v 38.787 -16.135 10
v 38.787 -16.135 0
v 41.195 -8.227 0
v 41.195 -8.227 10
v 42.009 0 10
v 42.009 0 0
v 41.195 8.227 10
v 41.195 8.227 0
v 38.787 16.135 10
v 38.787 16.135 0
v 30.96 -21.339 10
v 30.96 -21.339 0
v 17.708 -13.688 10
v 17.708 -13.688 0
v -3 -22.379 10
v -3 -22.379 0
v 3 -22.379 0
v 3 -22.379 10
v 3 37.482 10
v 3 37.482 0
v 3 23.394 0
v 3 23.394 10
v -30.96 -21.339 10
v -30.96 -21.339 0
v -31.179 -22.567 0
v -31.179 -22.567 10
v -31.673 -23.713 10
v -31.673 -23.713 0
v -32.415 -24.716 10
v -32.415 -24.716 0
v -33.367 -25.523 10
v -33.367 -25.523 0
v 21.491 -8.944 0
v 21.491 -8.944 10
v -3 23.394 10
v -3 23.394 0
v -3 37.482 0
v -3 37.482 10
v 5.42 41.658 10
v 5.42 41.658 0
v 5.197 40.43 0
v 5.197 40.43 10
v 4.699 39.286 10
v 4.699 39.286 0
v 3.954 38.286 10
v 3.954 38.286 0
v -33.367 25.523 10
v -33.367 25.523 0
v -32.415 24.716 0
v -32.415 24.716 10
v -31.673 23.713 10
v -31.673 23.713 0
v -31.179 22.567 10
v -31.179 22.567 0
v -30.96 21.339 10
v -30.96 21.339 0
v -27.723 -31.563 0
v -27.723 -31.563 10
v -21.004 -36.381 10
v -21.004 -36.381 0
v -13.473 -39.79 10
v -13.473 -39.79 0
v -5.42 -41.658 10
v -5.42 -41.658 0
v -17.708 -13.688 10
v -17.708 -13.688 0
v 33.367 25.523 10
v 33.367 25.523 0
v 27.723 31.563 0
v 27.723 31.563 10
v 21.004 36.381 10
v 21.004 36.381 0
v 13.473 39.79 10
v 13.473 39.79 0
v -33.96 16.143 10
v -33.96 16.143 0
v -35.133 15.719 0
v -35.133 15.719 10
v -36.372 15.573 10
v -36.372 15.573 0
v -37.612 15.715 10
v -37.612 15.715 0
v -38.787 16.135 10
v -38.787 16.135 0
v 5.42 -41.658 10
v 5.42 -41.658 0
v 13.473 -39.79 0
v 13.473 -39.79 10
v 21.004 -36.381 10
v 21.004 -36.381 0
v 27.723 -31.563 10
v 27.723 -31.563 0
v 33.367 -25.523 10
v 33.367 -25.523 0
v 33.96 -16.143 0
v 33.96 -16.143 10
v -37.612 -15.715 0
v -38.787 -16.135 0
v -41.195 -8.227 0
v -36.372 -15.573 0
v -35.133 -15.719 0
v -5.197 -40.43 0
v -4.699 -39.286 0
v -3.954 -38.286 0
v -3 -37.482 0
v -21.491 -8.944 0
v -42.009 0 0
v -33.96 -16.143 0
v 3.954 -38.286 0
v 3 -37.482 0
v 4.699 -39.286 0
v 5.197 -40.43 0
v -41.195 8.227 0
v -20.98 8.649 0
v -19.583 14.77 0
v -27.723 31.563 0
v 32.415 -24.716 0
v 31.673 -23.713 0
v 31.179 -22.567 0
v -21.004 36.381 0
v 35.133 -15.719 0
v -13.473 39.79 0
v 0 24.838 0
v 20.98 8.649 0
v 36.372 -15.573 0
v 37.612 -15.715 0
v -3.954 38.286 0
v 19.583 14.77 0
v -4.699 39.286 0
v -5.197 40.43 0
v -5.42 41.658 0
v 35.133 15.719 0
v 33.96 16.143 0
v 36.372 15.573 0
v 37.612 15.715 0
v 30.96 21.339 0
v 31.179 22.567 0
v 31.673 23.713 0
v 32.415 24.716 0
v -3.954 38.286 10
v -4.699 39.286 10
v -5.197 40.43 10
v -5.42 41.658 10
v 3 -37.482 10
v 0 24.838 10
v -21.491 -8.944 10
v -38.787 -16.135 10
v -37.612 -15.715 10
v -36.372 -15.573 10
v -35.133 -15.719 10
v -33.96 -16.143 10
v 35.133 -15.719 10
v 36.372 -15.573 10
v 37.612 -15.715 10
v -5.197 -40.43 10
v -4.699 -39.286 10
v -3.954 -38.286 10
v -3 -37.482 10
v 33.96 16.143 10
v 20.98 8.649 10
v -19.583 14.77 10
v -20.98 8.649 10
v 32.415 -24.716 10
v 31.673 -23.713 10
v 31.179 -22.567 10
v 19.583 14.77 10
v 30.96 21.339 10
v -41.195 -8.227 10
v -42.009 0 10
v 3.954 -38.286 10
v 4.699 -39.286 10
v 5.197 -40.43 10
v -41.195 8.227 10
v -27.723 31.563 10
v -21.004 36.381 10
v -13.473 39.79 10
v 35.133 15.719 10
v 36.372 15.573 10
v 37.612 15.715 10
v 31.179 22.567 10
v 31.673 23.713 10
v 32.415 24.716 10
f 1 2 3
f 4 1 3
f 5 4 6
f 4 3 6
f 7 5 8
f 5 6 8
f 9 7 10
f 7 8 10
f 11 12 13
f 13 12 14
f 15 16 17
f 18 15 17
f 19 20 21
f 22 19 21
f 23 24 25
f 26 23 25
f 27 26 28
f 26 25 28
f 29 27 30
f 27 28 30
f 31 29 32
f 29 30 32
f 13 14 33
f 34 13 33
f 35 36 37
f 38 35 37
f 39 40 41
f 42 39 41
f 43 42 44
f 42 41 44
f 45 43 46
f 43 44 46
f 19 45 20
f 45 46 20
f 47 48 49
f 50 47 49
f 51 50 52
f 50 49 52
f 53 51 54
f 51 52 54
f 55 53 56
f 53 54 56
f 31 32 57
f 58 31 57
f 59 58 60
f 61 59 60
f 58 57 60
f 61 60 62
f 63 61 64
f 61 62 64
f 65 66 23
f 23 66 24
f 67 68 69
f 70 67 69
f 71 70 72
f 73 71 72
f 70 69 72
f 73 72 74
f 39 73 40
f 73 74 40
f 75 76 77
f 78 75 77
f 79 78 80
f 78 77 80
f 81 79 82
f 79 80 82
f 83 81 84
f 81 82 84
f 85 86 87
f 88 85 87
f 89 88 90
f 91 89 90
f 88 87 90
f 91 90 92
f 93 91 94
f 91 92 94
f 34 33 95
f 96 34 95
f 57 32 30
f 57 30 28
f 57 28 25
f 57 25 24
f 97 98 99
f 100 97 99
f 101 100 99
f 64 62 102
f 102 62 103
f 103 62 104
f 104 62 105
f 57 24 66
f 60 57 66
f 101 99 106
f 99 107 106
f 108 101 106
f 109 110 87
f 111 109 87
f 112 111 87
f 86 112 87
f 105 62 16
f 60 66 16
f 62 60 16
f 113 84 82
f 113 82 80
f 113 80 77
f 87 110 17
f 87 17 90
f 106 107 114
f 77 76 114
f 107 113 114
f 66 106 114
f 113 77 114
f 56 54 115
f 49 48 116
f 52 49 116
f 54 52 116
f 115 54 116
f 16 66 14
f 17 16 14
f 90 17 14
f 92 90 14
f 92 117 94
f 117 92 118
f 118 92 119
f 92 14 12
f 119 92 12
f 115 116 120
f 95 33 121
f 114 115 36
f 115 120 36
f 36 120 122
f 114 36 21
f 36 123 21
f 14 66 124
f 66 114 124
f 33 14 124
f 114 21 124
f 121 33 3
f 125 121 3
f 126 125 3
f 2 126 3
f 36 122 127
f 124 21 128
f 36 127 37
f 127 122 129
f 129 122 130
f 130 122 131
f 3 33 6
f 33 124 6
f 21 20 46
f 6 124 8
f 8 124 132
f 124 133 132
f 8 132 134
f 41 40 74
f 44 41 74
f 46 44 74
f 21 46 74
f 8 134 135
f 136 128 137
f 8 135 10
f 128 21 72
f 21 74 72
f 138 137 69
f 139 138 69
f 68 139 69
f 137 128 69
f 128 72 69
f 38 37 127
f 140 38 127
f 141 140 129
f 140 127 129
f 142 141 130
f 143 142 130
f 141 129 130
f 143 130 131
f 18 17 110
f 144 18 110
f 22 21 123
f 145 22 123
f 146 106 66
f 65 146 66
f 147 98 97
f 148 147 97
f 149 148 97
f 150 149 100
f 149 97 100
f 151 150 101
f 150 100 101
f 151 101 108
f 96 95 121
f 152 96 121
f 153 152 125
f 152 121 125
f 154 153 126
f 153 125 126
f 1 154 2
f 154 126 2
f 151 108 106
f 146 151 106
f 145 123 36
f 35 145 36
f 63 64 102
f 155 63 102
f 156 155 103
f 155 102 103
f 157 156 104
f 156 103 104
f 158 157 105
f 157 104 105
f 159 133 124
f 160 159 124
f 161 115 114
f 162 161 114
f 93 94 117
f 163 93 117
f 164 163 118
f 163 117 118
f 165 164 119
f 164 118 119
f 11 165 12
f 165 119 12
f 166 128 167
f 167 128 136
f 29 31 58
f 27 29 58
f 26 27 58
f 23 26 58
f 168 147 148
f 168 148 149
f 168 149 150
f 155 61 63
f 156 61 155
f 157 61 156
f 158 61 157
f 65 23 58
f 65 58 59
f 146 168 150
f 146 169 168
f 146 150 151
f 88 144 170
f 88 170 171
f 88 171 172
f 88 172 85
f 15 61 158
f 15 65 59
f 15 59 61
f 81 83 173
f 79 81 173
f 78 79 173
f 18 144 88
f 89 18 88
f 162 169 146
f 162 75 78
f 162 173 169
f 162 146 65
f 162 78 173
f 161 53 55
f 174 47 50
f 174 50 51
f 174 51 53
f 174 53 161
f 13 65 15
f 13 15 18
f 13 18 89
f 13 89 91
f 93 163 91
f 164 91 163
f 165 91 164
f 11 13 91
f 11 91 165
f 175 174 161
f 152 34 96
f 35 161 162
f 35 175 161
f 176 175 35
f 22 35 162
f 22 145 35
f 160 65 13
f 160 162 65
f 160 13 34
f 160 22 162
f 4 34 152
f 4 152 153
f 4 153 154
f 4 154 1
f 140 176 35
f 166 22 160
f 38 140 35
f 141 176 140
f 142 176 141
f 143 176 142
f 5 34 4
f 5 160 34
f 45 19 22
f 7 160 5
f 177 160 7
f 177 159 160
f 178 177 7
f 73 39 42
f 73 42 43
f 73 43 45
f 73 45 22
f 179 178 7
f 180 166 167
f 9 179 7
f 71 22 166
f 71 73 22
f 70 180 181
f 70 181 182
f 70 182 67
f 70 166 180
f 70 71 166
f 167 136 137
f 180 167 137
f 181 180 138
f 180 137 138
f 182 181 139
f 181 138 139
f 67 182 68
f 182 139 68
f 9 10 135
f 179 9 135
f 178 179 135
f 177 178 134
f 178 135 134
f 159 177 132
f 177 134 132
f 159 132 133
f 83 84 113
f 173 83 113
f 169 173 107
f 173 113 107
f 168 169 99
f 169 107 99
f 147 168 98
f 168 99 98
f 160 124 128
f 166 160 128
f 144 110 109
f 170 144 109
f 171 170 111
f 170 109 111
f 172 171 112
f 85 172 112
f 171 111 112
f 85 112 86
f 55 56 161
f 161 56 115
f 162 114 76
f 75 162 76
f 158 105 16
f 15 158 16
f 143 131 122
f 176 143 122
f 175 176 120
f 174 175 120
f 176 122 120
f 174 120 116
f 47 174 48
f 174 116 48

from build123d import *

# Parameters (mm, degrees)
BOSS_EXTRUDE3_DEPTH = 10


with BuildPart() as part:
    # Sketch1 → Boss-Extrude3 (new body)
    with BuildSketch(Plane.XY):
        with BuildLine():
            Line((19.582862725, 14.770272681), (30.960060849, 21.33890108))
            ThreePointArc((30.960060849, 21.33890108), (31.673214627, 23.712775149), (33.366924266, 25.522530399))
            ThreePointArc((33.366924266, 25.522530399), (21.00447091, 36.380810803), (5.419697562, 41.65786926))
            ThreePointArc((5.419697562, 41.65786926), (4.69925836, 39.286196061), (3, 37.481649738))
            Line((3, 37.481649738), (3, 23.393619776))
            Line((3, 23.393619776), (0, 24.838343632))
            Line((0, 24.838343632), (-3, 23.393619776))
            Line((-3, 23.393619776), (-3, 37.481649738))
            ThreePointArc((-3, 37.481649738), (-4.69925836, 39.286196061), (-5.419697562, 41.65786926))
            ThreePointArc((-5.419697562, 41.65786926), (-21.00447091, 36.380810803), (-33.366924266, 25.522530399))
            ThreePointArc((-33.366924266, 25.522530399), (-31.673214627, 23.712775149), (-30.960060849, 21.33890108))
            Line((-30.960060849, 21.33890108), (-19.582862725, 14.770272681))
            Line((-19.582862725, 14.770272681), (-20.980061971, 8.648742811))
            Line((-20.980061971, 8.648742811), (-33.960060849, 16.142748658))
            ThreePointArc((-33.960060849, 16.142748658), (-36.372472987, 15.573420912), (-38.786621827, 16.135338861))
            ThreePointArc((-38.786621827, 16.135338861), (-42.008941821, 0), (-38.786621827, -16.135338861))
            ThreePointArc((-38.786621827, -16.135338861), (-36.372472987, -15.573420912), (-33.960060849, -16.142748658))
            Line((-33.960060849, -16.142748658), (-21.490919097, -8.943686311))
            Line((-21.490919097, -8.943686311), (-17.707725135, -13.687661489))
            Line((-17.707725135, -13.687661489), (-30.960060849, -21.33890108))
            ThreePointArc((-30.960060849, -21.33890108), (-31.673214627, -23.712775149), (-33.366924266, -25.522530399))
            ThreePointArc((-33.366924266, -25.522530399), (-21.00447091, -36.380810803), (-5.419697562, -41.65786926))
            ThreePointArc((-5.419697562, -41.65786926), (-4.69925836, -39.286196061), (-3, -37.481649738))
            Line((-3, -37.481649738), (-3, -22.378574343))
            Line((-3, -22.378574343), (3, -22.378574343))
            Line((3, -22.378574343), (3, -37.481649738))
            ThreePointArc((3, -37.481649738), (4.69925836, -39.286196061), (5.419697562, -41.65786926))
            ThreePointArc((5.419697562, -41.65786926), (21.00447091, -36.380810803), (33.366924266, -25.522530399))
            ThreePointArc((33.366924266, -25.522530399), (31.673214627, -23.712775149), (30.960060849, -21.33890108))
            Line((30.960060849, -21.33890108), (17.707725135, -13.687661489))
            Line((17.707725135, -13.687661489), (21.490919097, -8.943686311))
            Line((21.490919097, -8.943686311), (33.960060849, -16.142748658))
            ThreePointArc((33.960060849, -16.142748658), (36.372472987, -15.573420912), (38.786621827, -16.135338861))
            ThreePointArc((38.786621827, -16.135338861), (42.008941821, 0), (38.786621827, 16.135338861))
            ThreePointArc((38.786621827, 16.135338861), (36.372472987, 15.573420912), (33.960060849, 16.142748658))
            Line((33.960060849, 16.142748658), (20.980061971, 8.648742811))
            Line((20.980061971, 8.648742811), (19.582862725, 14.770272681))
        make_face()
    extrude(amount=BOSS_EXTRUDE3_DEPTH)


solid = part.part
